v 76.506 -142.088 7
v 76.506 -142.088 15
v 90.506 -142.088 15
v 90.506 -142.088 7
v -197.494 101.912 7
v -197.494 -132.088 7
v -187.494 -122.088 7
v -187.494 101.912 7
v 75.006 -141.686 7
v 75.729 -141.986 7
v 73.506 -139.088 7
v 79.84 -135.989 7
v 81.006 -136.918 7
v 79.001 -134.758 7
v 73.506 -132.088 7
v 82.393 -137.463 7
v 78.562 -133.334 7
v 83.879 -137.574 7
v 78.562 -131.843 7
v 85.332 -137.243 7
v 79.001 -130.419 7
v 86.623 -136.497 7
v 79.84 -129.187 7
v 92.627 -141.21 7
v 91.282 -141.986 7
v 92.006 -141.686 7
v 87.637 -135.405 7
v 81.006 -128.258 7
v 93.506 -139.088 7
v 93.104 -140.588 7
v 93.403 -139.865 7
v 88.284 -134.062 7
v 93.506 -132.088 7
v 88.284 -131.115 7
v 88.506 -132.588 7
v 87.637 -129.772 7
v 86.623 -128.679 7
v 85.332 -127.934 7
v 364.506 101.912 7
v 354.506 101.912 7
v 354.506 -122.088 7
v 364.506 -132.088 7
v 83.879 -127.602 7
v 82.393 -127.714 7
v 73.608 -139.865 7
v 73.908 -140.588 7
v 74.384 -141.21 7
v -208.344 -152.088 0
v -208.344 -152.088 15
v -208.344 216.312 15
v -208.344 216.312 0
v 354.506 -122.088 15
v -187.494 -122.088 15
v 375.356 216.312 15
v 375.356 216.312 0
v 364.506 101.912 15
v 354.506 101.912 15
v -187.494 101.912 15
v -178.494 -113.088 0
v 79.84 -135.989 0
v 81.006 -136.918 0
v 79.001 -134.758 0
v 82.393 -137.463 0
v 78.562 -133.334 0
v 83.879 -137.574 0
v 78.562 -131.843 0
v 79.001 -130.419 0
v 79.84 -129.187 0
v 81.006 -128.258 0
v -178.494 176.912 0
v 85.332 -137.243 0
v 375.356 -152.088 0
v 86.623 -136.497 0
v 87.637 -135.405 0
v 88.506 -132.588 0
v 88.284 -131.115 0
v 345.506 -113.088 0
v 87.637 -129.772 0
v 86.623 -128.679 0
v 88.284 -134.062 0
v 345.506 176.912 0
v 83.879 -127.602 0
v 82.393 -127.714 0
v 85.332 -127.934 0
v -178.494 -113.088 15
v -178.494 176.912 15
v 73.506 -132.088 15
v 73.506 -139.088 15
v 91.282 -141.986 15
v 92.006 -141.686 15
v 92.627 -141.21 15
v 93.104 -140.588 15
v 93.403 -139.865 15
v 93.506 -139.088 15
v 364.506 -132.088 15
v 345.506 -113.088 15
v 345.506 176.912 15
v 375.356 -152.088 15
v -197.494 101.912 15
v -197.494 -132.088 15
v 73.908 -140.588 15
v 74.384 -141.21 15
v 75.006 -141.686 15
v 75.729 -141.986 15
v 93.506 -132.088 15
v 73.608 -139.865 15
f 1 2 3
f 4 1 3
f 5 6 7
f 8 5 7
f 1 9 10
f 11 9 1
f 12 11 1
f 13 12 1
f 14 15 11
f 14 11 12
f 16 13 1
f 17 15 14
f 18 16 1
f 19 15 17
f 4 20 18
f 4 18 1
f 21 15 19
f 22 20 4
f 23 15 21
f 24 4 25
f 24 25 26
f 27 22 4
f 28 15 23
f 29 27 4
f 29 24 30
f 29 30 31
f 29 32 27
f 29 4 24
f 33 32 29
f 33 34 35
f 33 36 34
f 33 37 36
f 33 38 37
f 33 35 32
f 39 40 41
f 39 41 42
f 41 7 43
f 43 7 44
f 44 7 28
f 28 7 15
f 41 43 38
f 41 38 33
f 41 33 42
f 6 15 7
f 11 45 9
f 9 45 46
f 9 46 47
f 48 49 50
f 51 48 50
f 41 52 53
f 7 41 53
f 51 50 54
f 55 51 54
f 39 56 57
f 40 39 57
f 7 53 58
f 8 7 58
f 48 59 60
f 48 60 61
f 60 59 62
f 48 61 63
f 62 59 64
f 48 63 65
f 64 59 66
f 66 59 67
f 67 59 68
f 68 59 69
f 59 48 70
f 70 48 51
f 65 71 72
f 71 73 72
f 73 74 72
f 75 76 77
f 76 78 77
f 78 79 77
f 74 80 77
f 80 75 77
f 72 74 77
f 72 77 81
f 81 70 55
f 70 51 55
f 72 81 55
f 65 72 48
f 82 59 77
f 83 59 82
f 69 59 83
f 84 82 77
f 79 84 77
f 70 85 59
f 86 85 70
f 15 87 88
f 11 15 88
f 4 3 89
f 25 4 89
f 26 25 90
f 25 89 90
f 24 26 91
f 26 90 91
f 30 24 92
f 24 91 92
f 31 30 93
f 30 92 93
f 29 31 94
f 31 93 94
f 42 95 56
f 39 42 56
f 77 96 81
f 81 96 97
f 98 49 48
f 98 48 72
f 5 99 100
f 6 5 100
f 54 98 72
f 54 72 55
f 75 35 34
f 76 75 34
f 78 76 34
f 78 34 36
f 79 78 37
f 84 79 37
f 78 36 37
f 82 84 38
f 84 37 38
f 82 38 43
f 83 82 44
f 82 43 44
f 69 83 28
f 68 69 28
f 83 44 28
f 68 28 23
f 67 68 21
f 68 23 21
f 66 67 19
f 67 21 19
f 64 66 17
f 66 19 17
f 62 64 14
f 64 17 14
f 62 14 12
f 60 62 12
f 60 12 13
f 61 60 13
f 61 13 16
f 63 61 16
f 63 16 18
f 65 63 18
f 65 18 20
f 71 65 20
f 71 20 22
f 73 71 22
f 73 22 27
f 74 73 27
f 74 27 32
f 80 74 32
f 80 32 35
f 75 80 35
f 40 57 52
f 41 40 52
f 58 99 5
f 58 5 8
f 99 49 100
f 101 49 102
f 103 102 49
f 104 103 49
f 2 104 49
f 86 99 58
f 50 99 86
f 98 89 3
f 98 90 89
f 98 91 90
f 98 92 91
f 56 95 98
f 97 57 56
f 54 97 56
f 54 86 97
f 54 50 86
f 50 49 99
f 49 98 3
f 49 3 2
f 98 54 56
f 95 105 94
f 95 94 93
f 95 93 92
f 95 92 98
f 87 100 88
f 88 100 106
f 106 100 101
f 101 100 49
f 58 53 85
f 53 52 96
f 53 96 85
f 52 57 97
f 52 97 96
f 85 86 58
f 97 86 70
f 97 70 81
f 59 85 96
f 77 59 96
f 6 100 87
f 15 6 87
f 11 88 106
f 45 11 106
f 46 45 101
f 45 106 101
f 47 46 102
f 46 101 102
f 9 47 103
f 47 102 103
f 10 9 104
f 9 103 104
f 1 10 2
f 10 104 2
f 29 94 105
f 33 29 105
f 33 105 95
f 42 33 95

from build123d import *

# Parameters (mm, degrees)
EXTRUDE_1_OUTLINE_W = 563.7
EXTRUDE_1_OUTLINE_H = 348.4
EXTRUDE_1_DEPTH     = 15
SKETCH_3_W          = 524
SKETCH_3_H          = 290
CUT_EXTRUDE_1_DEPTH = 70
SKETCH_4_W          = 10
SKETCH_4_H          = 348.4
EXTRUDE_2_DEPTH     = 15
SKETCH_5_W          = 583.7
SKETCH_5_H          = 20
EXTRUDE_3_DEPTH     = 15
SKETCH_6_W          = 10
SKETCH_6_H          = 224
CUT_EXTRUDE_2_DEPTH = 8
SKETCH_7_R          = 5
CUT_EXTRUDE_3_DEPTH = 10


# Read off the part's stored shape, not the designer's step: 填料-伸長1
with BuildPart() as part:
    # 填料-伸長1 outline → 填料-伸長1 (new body)
    with BuildSketch(Plane.XY):
        with Locations((83.50571914, 42.111680092)):
            Rectangle(EXTRUDE_1_OUTLINE_W, EXTRUDE_1_OUTLINE_H)
    extrude(amount=EXTRUDE_1_DEPTH)

    # 草圖3 → 除料-伸長1 (cut)
    with BuildSketch(Plane.XY.offset(15)):
        with Locations((83.50571914, 31.911680092)):
            Rectangle(SKETCH_3_W, SKETCH_3_H)
    extrude(amount=-CUT_EXTRUDE_1_DEPTH, mode=Mode.SUBTRACT)

    # 草圖4 → 填料-伸長2 (add)
    with BuildSketch(Plane.XY.offset(15)):
        with Locations((-203.34428086, 42.111680092)):
            Rectangle(SKETCH_4_W, SKETCH_4_H)
        with Locations((370.35571914, 42.111680092)):
            Rectangle(SKETCH_4_W, SKETCH_4_H)
    extrude(amount=-EXTRUDE_2_DEPTH)

    # 草圖5 → 填料-伸長3 (add)
    with BuildSketch(Plane.XY.offset(15)):
        with Locations((83.50571914, -142.088319908)):
            Rectangle(SKETCH_5_W, SKETCH_5_H)
    extrude(amount=-EXTRUDE_3_DEPTH)

    # 草圖6 → 除料-伸長2 (cut)
    with BuildSketch(Plane.XY.offset(15)):
        Polygon((364.50571914, -132.088319908), (364.50571914, 101.911680092), (354.50571914, 101.911680092), (354.50571914, -122.088319908), (354.50571914, -132.088319908), align=None)
        with BuildLine():
            Line((354.50571914, -132.088319908), (354.50571914, -122.088319908))
            Line((354.50571914, -122.088319908), (93.50571914, -122.088319908))
            Line((93.50571914, -122.088319908), (73.50571914, -122.088319908))
            Line((73.50571914, -122.088319908), (-187.49428086, -122.088319908))
            Line((-187.49428086, -122.088319908), (-197.49428086, -122.088319908))
            Line((-197.49428086, -122.088319908), (-197.49428086, -132.088319908))
            Line((-197.49428086, -132.088319908), (73.50571914, -132.088319908))
            Line((73.50571914, -132.088319908), (73.50571914, -139.088319908))
            ThreePointArc((73.50571914, -139.088319908), (74.384398796, -141.209640251), (76.50571914, -142.088319908))
            Line((76.50571914, -142.088319908), (90.50571914, -142.088319908))
            ThreePointArc((90.50571914, -142.088319908), (92.627039483, -141.209640251), (93.50571914, -139.088319908))
            Line((93.50571914, -139.088319908), (93.50571914, -132.088319908))
            Line((93.50571914, -132.088319908), (354.50571914, -132.088319908))
        make_face()
        with Locations((-192.49428086, -10.088319908)):
            Rectangle(SKETCH_6_W, SKETCH_6_H)
    extrude(amount=-CUT_EXTRUDE_2_DEPTH, mode=Mode.SUBTRACT)

    # 草圖7 → 除料-伸長3 (cut)
    with BuildSketch(Plane.XY.offset(7)):
        with Locations((83.50571914, -132.588319908)):
            Circle(SKETCH_7_R)
    extrude(amount=-CUT_EXTRUDE_3_DEPTH, mode=Mode.SUBTRACT)


solid = part.part
